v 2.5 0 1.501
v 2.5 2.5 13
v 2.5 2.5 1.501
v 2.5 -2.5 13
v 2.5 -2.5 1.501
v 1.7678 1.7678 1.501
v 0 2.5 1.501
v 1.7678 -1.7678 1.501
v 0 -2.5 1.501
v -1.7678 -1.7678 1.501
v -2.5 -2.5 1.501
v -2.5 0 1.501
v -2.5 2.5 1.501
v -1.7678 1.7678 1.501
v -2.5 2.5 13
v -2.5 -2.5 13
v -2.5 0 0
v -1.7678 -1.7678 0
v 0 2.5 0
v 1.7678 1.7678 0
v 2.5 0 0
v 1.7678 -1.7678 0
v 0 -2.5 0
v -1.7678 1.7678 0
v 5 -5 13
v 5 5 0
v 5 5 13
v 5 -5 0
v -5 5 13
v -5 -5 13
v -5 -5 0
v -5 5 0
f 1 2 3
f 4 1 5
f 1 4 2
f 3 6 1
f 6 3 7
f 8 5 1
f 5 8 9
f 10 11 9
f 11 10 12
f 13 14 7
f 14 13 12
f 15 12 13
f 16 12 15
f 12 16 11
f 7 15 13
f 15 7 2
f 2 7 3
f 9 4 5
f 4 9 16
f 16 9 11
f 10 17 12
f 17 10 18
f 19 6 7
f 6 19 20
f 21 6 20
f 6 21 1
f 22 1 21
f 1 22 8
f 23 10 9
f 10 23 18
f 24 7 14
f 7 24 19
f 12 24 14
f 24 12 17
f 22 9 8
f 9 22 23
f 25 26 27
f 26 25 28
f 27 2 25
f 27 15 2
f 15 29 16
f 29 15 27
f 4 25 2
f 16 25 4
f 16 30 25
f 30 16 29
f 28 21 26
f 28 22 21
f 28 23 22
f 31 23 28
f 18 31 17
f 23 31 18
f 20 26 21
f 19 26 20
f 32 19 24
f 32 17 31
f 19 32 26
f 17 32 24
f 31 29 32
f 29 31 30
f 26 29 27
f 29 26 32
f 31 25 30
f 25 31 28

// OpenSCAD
testPrint();


module vibMotor(wires = true, wiresL = 1){
	extrasize = 0.2;
	width = 4.8 + extrasize;
	lenght = 11.3 + extrasize;

	translate([-width/2, -width/2, 0]){
		// motor
		cube([width,width,lenght]);
	}
	if (wires == true){
		translate([0,0,-wiresL]){
			// wires
			cylinder(r =width/2, wiresL+ 0.001);
		}
	}
}


module testPrint(){
	difference(){
		translate([-5,-5,0])  cube([10,10,13]);
		translate([0,0,1.501]) vibMotor(wiresL = 2);
	}
}
